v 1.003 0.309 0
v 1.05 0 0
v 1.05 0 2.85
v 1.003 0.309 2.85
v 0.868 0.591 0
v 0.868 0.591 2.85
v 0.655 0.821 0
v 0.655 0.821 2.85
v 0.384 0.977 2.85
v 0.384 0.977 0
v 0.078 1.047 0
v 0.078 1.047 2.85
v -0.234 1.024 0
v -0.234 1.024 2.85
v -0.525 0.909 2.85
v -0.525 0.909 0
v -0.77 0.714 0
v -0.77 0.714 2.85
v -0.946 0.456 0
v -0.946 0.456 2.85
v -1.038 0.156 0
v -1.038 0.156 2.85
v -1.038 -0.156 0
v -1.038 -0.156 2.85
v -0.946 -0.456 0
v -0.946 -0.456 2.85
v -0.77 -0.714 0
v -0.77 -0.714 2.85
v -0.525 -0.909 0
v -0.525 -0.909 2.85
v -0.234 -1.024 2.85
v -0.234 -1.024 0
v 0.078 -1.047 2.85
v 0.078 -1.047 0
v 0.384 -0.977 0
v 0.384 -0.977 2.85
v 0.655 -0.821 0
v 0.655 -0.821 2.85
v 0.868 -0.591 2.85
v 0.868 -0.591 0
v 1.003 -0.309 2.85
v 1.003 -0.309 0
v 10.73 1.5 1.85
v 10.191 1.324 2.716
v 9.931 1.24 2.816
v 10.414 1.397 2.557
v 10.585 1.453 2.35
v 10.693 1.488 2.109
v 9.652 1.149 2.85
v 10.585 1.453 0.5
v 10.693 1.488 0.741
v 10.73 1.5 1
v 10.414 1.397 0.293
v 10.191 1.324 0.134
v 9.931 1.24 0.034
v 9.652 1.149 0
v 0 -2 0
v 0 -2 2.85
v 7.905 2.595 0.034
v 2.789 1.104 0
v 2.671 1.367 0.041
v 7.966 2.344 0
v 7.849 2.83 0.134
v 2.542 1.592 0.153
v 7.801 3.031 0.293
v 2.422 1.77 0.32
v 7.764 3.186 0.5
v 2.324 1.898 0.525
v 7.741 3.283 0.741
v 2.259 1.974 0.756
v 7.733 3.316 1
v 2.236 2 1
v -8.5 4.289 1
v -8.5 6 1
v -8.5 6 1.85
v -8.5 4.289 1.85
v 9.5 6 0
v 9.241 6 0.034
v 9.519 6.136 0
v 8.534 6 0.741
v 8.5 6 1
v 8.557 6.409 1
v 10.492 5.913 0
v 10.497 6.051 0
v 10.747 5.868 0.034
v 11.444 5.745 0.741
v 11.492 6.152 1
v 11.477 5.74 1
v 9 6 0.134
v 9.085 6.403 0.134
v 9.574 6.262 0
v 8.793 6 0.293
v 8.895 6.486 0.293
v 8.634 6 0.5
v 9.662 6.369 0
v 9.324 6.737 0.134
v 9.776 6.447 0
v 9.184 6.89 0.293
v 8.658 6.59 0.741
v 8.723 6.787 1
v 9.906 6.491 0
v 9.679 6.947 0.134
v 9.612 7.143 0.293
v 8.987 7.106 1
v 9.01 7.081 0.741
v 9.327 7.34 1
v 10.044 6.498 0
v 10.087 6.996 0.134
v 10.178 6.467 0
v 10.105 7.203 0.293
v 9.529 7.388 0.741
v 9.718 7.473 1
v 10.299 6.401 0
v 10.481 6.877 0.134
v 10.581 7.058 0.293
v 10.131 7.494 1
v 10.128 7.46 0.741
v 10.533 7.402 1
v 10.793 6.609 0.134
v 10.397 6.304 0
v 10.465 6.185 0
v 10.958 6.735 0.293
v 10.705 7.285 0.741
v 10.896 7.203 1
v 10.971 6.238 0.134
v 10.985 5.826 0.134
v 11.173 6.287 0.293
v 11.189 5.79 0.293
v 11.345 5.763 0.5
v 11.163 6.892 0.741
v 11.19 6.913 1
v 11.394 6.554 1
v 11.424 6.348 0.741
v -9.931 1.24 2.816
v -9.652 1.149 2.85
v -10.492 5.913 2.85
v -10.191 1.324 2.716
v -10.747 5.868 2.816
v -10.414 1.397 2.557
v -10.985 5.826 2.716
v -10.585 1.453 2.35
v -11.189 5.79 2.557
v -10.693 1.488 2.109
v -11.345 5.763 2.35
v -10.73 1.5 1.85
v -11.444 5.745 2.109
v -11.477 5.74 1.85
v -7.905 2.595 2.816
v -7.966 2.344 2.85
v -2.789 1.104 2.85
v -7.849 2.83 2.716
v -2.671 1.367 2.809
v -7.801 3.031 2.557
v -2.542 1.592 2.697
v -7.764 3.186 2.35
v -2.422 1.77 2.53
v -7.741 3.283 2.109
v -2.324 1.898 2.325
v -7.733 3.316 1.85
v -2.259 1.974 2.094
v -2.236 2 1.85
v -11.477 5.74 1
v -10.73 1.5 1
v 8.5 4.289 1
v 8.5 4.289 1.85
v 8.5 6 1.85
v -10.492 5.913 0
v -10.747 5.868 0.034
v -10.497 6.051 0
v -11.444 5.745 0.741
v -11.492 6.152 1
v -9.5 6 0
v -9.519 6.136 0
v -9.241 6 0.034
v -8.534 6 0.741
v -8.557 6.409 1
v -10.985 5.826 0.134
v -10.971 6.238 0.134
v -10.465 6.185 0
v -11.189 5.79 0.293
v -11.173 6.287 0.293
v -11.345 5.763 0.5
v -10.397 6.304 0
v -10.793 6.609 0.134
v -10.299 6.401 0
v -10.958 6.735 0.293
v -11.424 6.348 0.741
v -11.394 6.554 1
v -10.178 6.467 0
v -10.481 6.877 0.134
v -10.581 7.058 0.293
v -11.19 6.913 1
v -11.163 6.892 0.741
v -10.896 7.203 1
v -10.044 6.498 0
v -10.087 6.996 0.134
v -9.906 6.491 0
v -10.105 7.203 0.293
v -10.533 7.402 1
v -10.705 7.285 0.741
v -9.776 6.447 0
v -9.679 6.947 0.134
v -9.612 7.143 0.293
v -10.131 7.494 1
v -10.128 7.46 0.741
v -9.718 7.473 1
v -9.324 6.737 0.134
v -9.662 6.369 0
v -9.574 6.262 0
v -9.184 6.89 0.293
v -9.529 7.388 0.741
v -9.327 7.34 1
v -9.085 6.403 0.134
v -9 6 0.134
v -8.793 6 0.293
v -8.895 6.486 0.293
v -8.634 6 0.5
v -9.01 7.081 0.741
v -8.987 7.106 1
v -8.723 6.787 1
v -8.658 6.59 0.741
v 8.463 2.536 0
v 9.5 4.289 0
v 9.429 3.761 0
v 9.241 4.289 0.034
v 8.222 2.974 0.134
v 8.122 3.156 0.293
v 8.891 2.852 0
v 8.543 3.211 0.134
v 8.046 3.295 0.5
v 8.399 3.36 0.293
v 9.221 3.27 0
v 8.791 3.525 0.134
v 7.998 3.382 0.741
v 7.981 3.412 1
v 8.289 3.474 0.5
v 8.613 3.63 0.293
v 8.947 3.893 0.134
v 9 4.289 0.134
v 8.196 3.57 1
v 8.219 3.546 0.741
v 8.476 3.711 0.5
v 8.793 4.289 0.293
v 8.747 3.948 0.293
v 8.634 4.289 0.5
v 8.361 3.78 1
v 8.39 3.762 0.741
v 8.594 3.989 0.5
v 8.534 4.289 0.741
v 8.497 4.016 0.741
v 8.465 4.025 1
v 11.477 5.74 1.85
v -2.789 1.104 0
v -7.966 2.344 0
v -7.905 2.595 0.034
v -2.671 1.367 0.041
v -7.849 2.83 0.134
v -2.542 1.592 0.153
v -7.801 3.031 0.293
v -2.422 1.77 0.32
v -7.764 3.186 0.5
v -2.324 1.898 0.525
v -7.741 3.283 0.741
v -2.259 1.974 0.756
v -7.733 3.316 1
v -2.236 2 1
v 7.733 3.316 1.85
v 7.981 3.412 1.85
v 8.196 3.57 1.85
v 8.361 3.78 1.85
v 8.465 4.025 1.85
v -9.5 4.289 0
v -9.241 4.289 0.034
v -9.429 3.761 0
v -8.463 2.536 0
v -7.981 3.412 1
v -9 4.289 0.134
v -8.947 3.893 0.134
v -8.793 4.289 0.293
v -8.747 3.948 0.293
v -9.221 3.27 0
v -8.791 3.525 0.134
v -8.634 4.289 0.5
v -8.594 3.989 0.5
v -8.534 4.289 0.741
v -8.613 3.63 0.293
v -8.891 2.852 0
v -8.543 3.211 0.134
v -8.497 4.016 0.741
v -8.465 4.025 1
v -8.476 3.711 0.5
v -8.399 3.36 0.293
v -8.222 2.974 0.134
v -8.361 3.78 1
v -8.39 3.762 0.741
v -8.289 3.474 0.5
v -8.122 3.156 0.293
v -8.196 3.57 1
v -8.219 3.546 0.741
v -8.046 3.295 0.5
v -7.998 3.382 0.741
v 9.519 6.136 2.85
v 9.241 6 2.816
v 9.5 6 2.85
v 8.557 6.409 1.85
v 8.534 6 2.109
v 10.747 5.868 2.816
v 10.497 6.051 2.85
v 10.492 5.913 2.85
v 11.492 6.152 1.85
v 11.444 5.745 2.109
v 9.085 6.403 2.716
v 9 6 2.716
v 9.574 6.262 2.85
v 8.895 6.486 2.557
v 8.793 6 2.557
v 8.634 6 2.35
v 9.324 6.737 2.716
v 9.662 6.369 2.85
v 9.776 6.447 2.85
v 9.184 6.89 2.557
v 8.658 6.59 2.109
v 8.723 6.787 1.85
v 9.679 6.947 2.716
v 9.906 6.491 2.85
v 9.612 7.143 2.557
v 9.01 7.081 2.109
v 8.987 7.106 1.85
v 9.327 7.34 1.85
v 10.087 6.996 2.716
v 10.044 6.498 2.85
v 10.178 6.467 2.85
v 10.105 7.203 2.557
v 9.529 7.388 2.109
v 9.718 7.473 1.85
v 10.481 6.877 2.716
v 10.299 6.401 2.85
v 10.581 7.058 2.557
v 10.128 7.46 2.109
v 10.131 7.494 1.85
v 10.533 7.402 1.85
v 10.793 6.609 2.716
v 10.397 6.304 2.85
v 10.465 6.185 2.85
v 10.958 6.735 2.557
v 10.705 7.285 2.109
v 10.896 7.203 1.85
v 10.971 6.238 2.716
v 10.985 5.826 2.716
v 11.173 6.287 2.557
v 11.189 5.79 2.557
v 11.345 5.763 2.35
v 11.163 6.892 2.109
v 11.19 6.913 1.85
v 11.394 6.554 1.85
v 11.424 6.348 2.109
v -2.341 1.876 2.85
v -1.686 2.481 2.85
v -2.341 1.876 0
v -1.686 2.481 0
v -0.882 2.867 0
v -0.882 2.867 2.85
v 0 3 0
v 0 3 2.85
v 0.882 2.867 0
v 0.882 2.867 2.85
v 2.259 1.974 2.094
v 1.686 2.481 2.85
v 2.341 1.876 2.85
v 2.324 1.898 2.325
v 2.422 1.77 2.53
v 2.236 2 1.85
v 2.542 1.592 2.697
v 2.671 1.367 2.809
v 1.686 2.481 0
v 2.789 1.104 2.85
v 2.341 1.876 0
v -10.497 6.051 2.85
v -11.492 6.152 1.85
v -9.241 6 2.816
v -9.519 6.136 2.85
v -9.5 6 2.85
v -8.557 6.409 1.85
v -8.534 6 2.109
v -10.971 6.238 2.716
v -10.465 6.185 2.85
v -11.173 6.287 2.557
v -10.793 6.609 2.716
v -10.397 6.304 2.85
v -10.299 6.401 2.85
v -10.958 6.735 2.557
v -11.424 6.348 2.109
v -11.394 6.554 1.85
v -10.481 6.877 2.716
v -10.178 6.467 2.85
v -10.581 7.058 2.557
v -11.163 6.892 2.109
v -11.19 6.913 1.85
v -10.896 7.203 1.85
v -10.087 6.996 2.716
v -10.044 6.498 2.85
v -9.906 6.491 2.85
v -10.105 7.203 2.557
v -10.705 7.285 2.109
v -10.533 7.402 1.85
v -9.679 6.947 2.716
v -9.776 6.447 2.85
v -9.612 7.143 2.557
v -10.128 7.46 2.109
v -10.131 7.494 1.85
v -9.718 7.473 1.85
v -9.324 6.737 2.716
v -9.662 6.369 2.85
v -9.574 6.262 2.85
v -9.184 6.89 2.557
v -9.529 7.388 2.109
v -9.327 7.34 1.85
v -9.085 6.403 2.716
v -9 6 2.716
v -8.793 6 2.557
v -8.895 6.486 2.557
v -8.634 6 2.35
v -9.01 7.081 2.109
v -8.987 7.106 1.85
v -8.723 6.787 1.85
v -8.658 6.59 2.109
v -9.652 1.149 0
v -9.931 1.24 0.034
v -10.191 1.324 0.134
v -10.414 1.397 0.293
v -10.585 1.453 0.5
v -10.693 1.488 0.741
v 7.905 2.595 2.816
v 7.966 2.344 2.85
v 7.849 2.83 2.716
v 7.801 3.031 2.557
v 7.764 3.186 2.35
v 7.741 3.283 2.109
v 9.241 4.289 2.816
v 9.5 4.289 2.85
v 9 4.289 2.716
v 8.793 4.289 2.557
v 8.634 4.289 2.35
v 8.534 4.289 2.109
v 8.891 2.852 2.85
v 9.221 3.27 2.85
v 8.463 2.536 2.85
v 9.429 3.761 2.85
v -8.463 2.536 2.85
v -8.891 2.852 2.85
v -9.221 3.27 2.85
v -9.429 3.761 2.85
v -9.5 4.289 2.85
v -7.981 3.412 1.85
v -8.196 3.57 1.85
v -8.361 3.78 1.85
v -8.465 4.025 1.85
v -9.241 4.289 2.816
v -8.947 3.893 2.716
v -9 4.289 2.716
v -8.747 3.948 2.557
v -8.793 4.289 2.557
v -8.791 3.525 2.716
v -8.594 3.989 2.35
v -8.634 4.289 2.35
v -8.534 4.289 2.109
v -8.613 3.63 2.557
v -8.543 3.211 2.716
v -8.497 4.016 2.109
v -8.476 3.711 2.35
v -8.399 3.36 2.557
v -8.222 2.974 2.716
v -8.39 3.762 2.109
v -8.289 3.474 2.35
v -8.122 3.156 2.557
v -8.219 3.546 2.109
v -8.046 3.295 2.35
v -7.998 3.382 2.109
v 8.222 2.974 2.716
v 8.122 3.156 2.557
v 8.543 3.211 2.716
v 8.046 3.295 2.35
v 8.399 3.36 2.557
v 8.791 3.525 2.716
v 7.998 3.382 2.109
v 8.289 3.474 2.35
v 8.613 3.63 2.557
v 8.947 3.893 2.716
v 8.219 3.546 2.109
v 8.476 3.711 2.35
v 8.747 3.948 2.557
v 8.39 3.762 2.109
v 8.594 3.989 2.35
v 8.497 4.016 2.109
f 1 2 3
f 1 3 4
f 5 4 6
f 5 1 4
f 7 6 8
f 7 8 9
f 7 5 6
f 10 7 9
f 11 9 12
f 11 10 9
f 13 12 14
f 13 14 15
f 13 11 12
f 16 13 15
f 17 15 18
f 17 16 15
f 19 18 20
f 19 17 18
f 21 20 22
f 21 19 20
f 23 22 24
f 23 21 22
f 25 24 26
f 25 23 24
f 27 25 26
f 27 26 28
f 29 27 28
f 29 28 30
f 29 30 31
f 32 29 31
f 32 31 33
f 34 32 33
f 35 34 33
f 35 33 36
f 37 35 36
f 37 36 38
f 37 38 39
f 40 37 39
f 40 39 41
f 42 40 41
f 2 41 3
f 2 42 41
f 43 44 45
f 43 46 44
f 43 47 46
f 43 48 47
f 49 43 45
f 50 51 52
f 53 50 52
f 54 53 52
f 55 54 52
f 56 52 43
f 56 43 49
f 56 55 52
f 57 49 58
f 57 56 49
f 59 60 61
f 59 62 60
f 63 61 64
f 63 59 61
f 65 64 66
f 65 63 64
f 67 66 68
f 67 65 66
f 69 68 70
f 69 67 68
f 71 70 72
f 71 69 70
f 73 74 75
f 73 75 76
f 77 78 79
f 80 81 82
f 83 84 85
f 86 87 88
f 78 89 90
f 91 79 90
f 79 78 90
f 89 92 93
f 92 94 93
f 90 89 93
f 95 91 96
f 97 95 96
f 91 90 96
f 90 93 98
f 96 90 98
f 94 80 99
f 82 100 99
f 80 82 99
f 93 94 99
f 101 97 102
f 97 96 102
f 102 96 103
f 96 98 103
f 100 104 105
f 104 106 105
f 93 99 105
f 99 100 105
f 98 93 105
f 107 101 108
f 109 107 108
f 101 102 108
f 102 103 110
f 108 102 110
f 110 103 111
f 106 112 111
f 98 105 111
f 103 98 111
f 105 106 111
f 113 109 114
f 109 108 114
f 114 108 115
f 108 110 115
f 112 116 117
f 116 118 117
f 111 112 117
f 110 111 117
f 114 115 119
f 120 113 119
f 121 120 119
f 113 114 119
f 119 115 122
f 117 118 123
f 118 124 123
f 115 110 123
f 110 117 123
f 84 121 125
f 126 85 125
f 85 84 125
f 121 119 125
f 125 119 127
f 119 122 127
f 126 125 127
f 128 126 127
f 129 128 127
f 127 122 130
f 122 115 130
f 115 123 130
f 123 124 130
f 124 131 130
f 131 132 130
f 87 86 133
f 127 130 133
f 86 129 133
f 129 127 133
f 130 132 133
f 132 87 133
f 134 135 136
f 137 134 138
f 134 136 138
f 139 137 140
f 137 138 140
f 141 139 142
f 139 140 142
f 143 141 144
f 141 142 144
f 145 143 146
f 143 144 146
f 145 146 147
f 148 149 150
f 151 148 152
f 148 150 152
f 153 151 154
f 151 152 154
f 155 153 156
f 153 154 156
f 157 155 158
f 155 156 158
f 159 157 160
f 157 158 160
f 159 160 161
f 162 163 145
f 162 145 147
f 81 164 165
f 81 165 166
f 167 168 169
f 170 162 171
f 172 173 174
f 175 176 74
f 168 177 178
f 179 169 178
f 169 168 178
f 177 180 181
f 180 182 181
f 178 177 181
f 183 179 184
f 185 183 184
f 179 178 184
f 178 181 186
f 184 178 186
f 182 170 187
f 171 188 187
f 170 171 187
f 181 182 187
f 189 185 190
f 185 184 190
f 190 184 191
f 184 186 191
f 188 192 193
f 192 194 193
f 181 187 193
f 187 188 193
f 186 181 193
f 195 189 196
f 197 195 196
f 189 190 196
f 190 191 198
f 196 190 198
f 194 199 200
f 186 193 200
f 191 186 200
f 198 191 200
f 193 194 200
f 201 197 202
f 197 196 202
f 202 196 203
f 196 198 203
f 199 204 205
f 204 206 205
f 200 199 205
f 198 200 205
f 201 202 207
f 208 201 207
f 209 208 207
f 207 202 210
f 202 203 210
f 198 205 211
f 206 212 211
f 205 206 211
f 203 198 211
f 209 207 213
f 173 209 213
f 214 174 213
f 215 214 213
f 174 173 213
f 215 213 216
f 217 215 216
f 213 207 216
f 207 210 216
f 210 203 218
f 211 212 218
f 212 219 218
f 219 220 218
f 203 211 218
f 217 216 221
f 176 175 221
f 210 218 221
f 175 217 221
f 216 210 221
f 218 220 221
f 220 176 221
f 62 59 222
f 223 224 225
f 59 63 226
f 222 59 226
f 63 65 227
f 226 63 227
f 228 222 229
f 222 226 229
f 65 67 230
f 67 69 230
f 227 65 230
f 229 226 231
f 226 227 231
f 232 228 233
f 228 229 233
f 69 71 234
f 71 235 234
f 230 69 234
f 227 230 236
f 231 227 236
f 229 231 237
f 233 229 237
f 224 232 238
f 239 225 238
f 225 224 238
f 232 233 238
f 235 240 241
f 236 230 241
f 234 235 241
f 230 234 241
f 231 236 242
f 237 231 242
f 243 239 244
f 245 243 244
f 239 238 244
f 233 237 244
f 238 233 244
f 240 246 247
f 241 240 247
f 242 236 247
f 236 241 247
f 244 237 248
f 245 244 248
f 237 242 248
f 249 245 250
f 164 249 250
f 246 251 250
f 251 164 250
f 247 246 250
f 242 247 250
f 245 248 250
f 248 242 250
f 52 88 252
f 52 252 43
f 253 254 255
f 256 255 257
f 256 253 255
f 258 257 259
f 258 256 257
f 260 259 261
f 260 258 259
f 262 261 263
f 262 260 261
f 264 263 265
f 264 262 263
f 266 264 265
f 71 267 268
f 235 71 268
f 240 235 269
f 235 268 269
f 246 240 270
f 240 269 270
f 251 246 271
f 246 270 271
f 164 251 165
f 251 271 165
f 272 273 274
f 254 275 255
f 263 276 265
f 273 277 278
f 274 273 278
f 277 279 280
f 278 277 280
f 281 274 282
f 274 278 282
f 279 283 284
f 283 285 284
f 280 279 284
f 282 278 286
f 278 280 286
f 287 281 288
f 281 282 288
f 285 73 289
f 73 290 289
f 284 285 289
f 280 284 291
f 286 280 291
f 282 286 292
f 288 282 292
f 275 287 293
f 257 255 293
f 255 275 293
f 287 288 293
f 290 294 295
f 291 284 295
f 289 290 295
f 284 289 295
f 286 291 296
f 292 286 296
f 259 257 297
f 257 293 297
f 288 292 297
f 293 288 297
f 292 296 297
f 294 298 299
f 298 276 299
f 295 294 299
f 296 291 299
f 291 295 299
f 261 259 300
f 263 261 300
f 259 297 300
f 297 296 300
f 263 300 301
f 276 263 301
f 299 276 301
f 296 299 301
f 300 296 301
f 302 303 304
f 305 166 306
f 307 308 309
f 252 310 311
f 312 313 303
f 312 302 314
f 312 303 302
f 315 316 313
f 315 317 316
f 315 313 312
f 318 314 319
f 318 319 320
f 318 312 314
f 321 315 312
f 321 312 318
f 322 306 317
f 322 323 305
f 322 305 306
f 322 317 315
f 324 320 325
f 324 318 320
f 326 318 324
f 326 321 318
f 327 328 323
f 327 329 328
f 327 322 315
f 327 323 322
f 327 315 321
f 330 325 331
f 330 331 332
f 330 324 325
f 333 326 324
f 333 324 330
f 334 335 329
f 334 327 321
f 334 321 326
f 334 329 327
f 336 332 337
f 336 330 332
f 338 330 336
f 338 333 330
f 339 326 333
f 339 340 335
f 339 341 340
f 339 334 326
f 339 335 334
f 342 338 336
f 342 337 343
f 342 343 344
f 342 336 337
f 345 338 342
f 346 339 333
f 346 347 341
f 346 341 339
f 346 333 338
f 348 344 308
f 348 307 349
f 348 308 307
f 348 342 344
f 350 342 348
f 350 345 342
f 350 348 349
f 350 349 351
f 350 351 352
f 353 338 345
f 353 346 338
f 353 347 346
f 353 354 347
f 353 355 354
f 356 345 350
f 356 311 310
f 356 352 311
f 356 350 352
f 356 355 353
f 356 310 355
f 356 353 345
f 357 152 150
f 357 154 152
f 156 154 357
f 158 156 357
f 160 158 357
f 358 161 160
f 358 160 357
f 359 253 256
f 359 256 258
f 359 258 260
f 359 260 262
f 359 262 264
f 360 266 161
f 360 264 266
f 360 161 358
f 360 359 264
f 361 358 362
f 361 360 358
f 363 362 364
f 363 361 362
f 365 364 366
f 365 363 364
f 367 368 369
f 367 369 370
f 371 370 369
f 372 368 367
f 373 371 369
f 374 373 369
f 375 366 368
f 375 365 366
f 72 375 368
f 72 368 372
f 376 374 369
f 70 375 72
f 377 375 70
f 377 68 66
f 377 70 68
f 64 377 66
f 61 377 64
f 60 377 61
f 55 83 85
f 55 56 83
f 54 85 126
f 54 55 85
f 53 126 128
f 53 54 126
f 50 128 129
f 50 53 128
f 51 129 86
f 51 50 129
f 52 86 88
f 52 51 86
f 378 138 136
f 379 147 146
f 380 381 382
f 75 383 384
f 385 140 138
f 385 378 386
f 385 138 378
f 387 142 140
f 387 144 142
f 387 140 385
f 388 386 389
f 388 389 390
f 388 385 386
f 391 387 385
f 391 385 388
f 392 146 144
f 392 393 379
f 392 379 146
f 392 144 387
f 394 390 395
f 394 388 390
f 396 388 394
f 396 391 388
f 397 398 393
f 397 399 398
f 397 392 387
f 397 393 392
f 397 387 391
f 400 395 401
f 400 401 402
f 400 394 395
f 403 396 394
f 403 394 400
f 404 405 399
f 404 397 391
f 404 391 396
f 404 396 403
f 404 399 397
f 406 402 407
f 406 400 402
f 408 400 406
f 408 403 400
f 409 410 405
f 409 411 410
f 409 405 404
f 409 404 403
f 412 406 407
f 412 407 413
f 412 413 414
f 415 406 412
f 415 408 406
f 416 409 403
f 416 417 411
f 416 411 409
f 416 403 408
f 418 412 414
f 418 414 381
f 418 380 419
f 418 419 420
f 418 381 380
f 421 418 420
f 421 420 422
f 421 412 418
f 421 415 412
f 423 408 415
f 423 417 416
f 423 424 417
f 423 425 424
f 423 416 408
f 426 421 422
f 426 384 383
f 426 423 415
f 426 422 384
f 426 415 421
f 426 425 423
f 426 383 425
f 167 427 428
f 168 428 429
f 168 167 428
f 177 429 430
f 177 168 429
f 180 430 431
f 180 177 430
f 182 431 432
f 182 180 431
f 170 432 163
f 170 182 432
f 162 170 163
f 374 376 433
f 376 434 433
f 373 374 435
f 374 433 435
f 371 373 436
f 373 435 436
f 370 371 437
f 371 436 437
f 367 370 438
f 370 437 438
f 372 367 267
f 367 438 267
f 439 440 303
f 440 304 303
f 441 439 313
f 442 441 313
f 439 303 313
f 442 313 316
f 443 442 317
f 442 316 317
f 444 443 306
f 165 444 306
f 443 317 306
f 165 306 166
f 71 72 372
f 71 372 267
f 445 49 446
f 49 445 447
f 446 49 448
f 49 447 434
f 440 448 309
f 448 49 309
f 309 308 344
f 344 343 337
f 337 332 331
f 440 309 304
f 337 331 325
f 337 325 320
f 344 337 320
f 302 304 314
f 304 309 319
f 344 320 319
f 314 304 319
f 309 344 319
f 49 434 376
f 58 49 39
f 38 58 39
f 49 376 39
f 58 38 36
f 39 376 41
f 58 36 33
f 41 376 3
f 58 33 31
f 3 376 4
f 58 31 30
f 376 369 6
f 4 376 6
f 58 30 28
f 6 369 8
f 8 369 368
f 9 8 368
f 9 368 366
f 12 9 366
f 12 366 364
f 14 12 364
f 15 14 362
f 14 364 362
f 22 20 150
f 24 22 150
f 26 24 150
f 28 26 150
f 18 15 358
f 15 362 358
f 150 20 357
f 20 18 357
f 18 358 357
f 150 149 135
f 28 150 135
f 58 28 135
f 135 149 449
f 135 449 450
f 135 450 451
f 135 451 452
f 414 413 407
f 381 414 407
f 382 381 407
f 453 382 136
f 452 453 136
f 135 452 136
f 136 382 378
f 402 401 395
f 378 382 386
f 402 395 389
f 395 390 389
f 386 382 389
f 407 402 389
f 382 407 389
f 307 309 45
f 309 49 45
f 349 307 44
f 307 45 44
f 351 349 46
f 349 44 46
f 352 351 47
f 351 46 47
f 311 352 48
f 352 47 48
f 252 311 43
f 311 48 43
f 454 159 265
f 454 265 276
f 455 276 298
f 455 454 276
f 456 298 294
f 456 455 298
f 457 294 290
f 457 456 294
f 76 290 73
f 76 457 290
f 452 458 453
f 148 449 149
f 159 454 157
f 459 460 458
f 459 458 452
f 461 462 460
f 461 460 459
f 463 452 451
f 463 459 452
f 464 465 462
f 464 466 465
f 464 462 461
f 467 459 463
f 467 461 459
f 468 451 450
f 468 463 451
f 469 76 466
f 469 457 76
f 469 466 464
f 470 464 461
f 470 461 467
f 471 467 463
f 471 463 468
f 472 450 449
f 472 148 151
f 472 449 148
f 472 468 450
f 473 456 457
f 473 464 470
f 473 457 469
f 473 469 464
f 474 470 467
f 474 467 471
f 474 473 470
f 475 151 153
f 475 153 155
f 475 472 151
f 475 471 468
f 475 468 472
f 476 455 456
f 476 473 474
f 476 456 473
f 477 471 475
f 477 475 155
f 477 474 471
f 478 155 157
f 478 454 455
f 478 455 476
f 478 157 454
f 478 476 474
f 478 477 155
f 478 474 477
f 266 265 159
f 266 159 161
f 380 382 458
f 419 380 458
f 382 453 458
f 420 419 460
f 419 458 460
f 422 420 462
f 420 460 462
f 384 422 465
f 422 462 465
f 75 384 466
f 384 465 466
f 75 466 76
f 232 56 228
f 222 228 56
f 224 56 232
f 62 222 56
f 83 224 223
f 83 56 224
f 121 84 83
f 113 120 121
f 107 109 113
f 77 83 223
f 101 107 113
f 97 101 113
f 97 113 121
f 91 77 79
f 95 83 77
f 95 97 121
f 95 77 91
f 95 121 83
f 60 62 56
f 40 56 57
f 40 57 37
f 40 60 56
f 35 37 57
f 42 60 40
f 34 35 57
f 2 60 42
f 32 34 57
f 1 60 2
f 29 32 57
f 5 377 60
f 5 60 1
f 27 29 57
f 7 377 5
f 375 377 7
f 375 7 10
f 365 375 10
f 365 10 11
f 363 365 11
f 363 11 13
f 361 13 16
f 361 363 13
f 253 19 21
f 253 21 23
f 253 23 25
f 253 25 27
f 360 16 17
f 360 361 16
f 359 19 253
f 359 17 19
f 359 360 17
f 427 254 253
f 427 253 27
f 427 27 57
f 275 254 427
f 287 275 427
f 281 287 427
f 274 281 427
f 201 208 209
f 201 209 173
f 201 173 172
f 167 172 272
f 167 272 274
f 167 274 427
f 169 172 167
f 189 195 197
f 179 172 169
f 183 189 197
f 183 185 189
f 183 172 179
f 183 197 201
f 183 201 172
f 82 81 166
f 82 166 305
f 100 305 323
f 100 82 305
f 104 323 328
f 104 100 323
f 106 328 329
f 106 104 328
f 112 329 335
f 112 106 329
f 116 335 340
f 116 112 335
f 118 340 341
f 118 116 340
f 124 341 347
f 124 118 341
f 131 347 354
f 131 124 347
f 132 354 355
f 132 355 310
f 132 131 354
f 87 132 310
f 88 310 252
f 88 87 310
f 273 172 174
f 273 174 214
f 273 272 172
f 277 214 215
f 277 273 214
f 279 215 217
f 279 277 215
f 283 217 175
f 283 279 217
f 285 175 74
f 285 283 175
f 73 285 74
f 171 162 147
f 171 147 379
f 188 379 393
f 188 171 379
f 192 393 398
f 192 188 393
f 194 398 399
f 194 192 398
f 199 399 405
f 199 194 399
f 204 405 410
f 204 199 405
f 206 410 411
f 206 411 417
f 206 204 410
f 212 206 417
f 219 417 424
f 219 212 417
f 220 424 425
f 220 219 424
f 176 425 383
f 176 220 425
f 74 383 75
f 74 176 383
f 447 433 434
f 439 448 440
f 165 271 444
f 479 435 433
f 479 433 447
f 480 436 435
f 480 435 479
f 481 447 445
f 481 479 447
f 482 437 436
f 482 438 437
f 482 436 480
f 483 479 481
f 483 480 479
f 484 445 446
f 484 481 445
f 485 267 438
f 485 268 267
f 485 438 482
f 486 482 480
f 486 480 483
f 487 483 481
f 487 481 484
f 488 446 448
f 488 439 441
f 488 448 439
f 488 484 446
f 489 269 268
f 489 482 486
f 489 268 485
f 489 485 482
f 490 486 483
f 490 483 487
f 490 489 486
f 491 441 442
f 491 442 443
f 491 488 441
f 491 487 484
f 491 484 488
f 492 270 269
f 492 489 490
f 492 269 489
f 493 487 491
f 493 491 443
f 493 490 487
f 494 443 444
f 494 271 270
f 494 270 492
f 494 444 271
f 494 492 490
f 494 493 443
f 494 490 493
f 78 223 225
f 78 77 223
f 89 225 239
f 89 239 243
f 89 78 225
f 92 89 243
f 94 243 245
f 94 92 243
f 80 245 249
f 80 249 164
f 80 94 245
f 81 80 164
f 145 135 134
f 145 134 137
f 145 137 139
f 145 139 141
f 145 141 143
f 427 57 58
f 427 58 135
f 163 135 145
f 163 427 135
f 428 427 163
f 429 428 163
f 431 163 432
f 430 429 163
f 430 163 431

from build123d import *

# Parameters (mm, degrees)
SKETCH1_R           = 1.05
BOSS_EXTRUDE1_DEPTH = 2.85
FILLET2_R           = 1
FILLET1_R           = 1


with BuildPart() as part:
    # Sketch1 → Boss-Extrude1 (new body)
    with BuildSketch(Plane.XY):
        with BuildLine():
            Line((2.236067977, 2), (8.5, 3.5))
            Line((8.5, 3.5), (8.5, 6))
            ThreePointArc((8.5, 6), (10.130733614, 7.494292047), (11.47721163, 5.739527733))
            Line((11.47721163, 5.739527733), (10.729668505, 1.5))
            Line((10.729668505, 1.5), (0, -2))
            Line((0, -2), (-10.729668505, 1.5))
            Line((-10.729668505, 1.5), (-11.47721163, 5.739527733))
            ThreePointArc((-11.47721163, 5.739527733), (-10.130733614, 7.494292047), (-8.5, 6))
            Line((-8.5, 6), (-8.5, 3.5))
            Line((-8.5, 3.5), (-2.236067977, 2))
            ThreePointArc((-2.236067977, 2), (0, 3), (2.236067977, 2))
        make_face()
        Circle(SKETCH1_R, mode=Mode.SUBTRACT)
    extrude(amount=BOSS_EXTRUDE1_DEPTH)

    # Fillet2
    fillet2_edges = [part.edges().sort_by_distance(p)[0] for p in [
        (8.5, 3.5, 1.425),
        (-8.5, 3.5, 1.425),
    ]]
    fillet(fillet2_edges, radius=FILLET2_R)

    # Fillet1
    fillet1_edges = [part.edges().sort_by_distance(p)[0] for p in [
        (8.5, 5.144403083, 0),
        (10.130733614, 7.494292047, 0),
        (11.103440067, 3.619763867, 0),
        (-11.103440067, 3.619763867, 0),
        (-10.130733614, 7.494292047, 0),
        (-10.130733614, 7.494292047, 2.85),
        (-4.984475025, 2.658150592, 0),
        (-11.103440067, 3.619763867, 2.85),
        (11.103440067, 3.619763867, 2.85),
        (10.130733614, 7.494292047, 2.85),
        (8.5, 5.144403083, 2.85),
        (-8.5, 5.144403083, 0),
        (-8.5, 5.144403083, 2.85),
        (4.984475025, 2.658150592, 0),
        (4.984475025, 2.658150592, 2.85),
        (-8.285137591, 3.669484793, 0),
        (-8.285137591, 3.669484793, 2.85),
        (8.285137591, 3.669484793, 0),
        (8.285137591, 3.669484793, 2.85),
        (-4.984475025, 2.658150592, 2.85),
    ]]
    fillet(fillet1_edges, radius=FILLET1_R)


solid = part.part
